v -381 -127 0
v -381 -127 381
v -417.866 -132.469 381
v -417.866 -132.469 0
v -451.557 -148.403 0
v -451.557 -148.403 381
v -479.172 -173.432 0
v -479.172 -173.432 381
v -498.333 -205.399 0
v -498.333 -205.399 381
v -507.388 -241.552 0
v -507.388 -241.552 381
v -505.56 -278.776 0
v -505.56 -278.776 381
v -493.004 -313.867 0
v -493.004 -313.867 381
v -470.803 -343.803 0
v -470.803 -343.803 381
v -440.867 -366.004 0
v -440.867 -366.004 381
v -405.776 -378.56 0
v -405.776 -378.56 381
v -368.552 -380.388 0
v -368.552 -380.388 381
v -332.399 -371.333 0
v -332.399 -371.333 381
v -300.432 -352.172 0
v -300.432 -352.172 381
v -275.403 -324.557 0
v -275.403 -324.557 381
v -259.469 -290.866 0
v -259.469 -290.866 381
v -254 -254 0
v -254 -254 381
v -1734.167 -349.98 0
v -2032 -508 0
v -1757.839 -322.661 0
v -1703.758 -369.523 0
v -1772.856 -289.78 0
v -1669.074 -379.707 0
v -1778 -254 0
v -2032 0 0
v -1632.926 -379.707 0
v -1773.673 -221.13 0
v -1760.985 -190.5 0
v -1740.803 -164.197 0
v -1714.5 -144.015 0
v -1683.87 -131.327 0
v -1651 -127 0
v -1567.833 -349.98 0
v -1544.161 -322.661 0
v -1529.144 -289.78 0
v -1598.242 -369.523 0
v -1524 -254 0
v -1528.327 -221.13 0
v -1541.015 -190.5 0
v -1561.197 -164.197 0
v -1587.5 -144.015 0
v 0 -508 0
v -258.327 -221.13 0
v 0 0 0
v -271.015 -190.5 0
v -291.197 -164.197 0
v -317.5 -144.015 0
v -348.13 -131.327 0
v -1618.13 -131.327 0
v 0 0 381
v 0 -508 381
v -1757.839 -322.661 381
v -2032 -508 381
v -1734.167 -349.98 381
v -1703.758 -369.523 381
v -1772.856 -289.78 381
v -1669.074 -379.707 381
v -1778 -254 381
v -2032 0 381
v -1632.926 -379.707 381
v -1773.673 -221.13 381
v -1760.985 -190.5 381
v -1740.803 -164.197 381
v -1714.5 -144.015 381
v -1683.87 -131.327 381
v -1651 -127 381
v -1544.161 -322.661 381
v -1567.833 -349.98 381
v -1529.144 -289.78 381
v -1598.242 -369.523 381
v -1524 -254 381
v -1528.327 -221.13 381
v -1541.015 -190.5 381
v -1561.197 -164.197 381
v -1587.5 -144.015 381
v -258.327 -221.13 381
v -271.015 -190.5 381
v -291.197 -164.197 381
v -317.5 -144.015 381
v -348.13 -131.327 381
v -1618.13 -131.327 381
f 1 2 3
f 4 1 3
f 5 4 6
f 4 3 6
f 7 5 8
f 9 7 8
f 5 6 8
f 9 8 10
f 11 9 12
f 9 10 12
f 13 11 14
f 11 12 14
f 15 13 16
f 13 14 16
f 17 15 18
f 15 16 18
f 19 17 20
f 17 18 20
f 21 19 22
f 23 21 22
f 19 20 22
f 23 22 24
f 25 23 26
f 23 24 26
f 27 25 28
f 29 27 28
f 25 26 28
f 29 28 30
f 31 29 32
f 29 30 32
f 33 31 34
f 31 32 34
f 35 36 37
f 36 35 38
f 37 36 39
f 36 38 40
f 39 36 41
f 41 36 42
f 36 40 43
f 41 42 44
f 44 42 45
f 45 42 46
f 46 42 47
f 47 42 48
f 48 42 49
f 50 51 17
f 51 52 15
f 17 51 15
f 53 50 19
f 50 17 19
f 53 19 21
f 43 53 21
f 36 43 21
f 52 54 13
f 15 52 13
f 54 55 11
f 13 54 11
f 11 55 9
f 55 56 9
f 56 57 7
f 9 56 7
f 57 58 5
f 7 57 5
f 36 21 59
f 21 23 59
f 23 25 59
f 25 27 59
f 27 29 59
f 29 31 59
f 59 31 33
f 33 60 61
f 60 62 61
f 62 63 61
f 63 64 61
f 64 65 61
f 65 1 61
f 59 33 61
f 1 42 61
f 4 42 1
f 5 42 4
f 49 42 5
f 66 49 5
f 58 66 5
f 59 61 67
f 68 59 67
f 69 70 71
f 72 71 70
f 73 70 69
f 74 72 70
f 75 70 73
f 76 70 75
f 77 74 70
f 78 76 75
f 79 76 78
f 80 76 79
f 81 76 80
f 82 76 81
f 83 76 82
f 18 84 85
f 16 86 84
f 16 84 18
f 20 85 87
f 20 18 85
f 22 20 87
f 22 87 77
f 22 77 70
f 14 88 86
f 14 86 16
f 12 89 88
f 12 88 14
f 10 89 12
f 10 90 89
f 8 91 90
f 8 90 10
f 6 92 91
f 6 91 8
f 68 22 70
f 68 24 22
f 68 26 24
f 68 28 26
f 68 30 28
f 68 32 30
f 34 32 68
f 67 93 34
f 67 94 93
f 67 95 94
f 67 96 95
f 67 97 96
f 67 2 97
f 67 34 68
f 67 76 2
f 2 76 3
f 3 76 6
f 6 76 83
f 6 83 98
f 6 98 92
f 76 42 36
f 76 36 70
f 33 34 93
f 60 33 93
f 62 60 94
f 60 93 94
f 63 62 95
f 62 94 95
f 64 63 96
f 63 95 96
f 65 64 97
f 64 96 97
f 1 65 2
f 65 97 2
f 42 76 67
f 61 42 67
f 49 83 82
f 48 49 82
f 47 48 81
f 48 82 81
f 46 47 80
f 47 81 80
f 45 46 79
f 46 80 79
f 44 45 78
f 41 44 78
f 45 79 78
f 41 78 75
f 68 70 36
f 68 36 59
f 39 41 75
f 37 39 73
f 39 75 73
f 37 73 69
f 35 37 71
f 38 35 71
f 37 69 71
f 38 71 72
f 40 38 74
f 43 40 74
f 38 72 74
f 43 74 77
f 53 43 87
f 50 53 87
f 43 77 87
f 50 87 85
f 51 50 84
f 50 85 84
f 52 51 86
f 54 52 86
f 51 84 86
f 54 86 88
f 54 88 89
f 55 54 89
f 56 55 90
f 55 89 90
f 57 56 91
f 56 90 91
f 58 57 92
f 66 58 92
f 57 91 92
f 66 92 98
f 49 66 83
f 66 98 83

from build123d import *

# Parameters (mm, degrees)
F0_W     = 2032
F0_H     = 381
F1_DEPTH = 508
F3_DEPTH = 508


with BuildPart() as f1:
    # F0 (on Front) → F1 (new body)
    with BuildSketch(Plane.XZ):
        with Locations((-1016, 190.5)):
            Rectangle(F0_W, F0_H)
    extrude(amount=F1_DEPTH)

    # F2 (on face) → F3 (cut)
    with BuildSketch(Plane.XY.offset(381)):
        with BuildLine():
            ThreePointArc((-1524, -254), (-1561.197439, -164.197439), (-1651, -127))
            Line((-1651, -127), (-1651, -254))
            Line((-1651, -254), (-1778, -254))
            ThreePointArc((-1778, -254), (-1651, -381), (-1524, -254))
        make_face()
        with BuildLine():
            Line((-1651, -254), (-1651, -127))
            ThreePointArc((-1651, -127), (-1740.802561, -164.197439), (-1778, -254))
            Line((-1778, -254), (-1651, -254))
        make_face()
        with BuildLine():
            ThreePointArc((-254, -254), (-291.197439, -164.197439), (-381, -127))
            Line((-381, -127), (-381, -254))
            Line((-381, -254), (-254, -254))
        make_face()
        with BuildLine():
            Line((-381, -254), (-381, -127))
            ThreePointArc((-381, -127), (-470.802561, -343.802561), (-254, -254))
            Line((-254, -254), (-381, -254))
        make_face()
    extrude(amount=-F3_DEPTH, mode=Mode.SUBTRACT)


solid = f1.part
